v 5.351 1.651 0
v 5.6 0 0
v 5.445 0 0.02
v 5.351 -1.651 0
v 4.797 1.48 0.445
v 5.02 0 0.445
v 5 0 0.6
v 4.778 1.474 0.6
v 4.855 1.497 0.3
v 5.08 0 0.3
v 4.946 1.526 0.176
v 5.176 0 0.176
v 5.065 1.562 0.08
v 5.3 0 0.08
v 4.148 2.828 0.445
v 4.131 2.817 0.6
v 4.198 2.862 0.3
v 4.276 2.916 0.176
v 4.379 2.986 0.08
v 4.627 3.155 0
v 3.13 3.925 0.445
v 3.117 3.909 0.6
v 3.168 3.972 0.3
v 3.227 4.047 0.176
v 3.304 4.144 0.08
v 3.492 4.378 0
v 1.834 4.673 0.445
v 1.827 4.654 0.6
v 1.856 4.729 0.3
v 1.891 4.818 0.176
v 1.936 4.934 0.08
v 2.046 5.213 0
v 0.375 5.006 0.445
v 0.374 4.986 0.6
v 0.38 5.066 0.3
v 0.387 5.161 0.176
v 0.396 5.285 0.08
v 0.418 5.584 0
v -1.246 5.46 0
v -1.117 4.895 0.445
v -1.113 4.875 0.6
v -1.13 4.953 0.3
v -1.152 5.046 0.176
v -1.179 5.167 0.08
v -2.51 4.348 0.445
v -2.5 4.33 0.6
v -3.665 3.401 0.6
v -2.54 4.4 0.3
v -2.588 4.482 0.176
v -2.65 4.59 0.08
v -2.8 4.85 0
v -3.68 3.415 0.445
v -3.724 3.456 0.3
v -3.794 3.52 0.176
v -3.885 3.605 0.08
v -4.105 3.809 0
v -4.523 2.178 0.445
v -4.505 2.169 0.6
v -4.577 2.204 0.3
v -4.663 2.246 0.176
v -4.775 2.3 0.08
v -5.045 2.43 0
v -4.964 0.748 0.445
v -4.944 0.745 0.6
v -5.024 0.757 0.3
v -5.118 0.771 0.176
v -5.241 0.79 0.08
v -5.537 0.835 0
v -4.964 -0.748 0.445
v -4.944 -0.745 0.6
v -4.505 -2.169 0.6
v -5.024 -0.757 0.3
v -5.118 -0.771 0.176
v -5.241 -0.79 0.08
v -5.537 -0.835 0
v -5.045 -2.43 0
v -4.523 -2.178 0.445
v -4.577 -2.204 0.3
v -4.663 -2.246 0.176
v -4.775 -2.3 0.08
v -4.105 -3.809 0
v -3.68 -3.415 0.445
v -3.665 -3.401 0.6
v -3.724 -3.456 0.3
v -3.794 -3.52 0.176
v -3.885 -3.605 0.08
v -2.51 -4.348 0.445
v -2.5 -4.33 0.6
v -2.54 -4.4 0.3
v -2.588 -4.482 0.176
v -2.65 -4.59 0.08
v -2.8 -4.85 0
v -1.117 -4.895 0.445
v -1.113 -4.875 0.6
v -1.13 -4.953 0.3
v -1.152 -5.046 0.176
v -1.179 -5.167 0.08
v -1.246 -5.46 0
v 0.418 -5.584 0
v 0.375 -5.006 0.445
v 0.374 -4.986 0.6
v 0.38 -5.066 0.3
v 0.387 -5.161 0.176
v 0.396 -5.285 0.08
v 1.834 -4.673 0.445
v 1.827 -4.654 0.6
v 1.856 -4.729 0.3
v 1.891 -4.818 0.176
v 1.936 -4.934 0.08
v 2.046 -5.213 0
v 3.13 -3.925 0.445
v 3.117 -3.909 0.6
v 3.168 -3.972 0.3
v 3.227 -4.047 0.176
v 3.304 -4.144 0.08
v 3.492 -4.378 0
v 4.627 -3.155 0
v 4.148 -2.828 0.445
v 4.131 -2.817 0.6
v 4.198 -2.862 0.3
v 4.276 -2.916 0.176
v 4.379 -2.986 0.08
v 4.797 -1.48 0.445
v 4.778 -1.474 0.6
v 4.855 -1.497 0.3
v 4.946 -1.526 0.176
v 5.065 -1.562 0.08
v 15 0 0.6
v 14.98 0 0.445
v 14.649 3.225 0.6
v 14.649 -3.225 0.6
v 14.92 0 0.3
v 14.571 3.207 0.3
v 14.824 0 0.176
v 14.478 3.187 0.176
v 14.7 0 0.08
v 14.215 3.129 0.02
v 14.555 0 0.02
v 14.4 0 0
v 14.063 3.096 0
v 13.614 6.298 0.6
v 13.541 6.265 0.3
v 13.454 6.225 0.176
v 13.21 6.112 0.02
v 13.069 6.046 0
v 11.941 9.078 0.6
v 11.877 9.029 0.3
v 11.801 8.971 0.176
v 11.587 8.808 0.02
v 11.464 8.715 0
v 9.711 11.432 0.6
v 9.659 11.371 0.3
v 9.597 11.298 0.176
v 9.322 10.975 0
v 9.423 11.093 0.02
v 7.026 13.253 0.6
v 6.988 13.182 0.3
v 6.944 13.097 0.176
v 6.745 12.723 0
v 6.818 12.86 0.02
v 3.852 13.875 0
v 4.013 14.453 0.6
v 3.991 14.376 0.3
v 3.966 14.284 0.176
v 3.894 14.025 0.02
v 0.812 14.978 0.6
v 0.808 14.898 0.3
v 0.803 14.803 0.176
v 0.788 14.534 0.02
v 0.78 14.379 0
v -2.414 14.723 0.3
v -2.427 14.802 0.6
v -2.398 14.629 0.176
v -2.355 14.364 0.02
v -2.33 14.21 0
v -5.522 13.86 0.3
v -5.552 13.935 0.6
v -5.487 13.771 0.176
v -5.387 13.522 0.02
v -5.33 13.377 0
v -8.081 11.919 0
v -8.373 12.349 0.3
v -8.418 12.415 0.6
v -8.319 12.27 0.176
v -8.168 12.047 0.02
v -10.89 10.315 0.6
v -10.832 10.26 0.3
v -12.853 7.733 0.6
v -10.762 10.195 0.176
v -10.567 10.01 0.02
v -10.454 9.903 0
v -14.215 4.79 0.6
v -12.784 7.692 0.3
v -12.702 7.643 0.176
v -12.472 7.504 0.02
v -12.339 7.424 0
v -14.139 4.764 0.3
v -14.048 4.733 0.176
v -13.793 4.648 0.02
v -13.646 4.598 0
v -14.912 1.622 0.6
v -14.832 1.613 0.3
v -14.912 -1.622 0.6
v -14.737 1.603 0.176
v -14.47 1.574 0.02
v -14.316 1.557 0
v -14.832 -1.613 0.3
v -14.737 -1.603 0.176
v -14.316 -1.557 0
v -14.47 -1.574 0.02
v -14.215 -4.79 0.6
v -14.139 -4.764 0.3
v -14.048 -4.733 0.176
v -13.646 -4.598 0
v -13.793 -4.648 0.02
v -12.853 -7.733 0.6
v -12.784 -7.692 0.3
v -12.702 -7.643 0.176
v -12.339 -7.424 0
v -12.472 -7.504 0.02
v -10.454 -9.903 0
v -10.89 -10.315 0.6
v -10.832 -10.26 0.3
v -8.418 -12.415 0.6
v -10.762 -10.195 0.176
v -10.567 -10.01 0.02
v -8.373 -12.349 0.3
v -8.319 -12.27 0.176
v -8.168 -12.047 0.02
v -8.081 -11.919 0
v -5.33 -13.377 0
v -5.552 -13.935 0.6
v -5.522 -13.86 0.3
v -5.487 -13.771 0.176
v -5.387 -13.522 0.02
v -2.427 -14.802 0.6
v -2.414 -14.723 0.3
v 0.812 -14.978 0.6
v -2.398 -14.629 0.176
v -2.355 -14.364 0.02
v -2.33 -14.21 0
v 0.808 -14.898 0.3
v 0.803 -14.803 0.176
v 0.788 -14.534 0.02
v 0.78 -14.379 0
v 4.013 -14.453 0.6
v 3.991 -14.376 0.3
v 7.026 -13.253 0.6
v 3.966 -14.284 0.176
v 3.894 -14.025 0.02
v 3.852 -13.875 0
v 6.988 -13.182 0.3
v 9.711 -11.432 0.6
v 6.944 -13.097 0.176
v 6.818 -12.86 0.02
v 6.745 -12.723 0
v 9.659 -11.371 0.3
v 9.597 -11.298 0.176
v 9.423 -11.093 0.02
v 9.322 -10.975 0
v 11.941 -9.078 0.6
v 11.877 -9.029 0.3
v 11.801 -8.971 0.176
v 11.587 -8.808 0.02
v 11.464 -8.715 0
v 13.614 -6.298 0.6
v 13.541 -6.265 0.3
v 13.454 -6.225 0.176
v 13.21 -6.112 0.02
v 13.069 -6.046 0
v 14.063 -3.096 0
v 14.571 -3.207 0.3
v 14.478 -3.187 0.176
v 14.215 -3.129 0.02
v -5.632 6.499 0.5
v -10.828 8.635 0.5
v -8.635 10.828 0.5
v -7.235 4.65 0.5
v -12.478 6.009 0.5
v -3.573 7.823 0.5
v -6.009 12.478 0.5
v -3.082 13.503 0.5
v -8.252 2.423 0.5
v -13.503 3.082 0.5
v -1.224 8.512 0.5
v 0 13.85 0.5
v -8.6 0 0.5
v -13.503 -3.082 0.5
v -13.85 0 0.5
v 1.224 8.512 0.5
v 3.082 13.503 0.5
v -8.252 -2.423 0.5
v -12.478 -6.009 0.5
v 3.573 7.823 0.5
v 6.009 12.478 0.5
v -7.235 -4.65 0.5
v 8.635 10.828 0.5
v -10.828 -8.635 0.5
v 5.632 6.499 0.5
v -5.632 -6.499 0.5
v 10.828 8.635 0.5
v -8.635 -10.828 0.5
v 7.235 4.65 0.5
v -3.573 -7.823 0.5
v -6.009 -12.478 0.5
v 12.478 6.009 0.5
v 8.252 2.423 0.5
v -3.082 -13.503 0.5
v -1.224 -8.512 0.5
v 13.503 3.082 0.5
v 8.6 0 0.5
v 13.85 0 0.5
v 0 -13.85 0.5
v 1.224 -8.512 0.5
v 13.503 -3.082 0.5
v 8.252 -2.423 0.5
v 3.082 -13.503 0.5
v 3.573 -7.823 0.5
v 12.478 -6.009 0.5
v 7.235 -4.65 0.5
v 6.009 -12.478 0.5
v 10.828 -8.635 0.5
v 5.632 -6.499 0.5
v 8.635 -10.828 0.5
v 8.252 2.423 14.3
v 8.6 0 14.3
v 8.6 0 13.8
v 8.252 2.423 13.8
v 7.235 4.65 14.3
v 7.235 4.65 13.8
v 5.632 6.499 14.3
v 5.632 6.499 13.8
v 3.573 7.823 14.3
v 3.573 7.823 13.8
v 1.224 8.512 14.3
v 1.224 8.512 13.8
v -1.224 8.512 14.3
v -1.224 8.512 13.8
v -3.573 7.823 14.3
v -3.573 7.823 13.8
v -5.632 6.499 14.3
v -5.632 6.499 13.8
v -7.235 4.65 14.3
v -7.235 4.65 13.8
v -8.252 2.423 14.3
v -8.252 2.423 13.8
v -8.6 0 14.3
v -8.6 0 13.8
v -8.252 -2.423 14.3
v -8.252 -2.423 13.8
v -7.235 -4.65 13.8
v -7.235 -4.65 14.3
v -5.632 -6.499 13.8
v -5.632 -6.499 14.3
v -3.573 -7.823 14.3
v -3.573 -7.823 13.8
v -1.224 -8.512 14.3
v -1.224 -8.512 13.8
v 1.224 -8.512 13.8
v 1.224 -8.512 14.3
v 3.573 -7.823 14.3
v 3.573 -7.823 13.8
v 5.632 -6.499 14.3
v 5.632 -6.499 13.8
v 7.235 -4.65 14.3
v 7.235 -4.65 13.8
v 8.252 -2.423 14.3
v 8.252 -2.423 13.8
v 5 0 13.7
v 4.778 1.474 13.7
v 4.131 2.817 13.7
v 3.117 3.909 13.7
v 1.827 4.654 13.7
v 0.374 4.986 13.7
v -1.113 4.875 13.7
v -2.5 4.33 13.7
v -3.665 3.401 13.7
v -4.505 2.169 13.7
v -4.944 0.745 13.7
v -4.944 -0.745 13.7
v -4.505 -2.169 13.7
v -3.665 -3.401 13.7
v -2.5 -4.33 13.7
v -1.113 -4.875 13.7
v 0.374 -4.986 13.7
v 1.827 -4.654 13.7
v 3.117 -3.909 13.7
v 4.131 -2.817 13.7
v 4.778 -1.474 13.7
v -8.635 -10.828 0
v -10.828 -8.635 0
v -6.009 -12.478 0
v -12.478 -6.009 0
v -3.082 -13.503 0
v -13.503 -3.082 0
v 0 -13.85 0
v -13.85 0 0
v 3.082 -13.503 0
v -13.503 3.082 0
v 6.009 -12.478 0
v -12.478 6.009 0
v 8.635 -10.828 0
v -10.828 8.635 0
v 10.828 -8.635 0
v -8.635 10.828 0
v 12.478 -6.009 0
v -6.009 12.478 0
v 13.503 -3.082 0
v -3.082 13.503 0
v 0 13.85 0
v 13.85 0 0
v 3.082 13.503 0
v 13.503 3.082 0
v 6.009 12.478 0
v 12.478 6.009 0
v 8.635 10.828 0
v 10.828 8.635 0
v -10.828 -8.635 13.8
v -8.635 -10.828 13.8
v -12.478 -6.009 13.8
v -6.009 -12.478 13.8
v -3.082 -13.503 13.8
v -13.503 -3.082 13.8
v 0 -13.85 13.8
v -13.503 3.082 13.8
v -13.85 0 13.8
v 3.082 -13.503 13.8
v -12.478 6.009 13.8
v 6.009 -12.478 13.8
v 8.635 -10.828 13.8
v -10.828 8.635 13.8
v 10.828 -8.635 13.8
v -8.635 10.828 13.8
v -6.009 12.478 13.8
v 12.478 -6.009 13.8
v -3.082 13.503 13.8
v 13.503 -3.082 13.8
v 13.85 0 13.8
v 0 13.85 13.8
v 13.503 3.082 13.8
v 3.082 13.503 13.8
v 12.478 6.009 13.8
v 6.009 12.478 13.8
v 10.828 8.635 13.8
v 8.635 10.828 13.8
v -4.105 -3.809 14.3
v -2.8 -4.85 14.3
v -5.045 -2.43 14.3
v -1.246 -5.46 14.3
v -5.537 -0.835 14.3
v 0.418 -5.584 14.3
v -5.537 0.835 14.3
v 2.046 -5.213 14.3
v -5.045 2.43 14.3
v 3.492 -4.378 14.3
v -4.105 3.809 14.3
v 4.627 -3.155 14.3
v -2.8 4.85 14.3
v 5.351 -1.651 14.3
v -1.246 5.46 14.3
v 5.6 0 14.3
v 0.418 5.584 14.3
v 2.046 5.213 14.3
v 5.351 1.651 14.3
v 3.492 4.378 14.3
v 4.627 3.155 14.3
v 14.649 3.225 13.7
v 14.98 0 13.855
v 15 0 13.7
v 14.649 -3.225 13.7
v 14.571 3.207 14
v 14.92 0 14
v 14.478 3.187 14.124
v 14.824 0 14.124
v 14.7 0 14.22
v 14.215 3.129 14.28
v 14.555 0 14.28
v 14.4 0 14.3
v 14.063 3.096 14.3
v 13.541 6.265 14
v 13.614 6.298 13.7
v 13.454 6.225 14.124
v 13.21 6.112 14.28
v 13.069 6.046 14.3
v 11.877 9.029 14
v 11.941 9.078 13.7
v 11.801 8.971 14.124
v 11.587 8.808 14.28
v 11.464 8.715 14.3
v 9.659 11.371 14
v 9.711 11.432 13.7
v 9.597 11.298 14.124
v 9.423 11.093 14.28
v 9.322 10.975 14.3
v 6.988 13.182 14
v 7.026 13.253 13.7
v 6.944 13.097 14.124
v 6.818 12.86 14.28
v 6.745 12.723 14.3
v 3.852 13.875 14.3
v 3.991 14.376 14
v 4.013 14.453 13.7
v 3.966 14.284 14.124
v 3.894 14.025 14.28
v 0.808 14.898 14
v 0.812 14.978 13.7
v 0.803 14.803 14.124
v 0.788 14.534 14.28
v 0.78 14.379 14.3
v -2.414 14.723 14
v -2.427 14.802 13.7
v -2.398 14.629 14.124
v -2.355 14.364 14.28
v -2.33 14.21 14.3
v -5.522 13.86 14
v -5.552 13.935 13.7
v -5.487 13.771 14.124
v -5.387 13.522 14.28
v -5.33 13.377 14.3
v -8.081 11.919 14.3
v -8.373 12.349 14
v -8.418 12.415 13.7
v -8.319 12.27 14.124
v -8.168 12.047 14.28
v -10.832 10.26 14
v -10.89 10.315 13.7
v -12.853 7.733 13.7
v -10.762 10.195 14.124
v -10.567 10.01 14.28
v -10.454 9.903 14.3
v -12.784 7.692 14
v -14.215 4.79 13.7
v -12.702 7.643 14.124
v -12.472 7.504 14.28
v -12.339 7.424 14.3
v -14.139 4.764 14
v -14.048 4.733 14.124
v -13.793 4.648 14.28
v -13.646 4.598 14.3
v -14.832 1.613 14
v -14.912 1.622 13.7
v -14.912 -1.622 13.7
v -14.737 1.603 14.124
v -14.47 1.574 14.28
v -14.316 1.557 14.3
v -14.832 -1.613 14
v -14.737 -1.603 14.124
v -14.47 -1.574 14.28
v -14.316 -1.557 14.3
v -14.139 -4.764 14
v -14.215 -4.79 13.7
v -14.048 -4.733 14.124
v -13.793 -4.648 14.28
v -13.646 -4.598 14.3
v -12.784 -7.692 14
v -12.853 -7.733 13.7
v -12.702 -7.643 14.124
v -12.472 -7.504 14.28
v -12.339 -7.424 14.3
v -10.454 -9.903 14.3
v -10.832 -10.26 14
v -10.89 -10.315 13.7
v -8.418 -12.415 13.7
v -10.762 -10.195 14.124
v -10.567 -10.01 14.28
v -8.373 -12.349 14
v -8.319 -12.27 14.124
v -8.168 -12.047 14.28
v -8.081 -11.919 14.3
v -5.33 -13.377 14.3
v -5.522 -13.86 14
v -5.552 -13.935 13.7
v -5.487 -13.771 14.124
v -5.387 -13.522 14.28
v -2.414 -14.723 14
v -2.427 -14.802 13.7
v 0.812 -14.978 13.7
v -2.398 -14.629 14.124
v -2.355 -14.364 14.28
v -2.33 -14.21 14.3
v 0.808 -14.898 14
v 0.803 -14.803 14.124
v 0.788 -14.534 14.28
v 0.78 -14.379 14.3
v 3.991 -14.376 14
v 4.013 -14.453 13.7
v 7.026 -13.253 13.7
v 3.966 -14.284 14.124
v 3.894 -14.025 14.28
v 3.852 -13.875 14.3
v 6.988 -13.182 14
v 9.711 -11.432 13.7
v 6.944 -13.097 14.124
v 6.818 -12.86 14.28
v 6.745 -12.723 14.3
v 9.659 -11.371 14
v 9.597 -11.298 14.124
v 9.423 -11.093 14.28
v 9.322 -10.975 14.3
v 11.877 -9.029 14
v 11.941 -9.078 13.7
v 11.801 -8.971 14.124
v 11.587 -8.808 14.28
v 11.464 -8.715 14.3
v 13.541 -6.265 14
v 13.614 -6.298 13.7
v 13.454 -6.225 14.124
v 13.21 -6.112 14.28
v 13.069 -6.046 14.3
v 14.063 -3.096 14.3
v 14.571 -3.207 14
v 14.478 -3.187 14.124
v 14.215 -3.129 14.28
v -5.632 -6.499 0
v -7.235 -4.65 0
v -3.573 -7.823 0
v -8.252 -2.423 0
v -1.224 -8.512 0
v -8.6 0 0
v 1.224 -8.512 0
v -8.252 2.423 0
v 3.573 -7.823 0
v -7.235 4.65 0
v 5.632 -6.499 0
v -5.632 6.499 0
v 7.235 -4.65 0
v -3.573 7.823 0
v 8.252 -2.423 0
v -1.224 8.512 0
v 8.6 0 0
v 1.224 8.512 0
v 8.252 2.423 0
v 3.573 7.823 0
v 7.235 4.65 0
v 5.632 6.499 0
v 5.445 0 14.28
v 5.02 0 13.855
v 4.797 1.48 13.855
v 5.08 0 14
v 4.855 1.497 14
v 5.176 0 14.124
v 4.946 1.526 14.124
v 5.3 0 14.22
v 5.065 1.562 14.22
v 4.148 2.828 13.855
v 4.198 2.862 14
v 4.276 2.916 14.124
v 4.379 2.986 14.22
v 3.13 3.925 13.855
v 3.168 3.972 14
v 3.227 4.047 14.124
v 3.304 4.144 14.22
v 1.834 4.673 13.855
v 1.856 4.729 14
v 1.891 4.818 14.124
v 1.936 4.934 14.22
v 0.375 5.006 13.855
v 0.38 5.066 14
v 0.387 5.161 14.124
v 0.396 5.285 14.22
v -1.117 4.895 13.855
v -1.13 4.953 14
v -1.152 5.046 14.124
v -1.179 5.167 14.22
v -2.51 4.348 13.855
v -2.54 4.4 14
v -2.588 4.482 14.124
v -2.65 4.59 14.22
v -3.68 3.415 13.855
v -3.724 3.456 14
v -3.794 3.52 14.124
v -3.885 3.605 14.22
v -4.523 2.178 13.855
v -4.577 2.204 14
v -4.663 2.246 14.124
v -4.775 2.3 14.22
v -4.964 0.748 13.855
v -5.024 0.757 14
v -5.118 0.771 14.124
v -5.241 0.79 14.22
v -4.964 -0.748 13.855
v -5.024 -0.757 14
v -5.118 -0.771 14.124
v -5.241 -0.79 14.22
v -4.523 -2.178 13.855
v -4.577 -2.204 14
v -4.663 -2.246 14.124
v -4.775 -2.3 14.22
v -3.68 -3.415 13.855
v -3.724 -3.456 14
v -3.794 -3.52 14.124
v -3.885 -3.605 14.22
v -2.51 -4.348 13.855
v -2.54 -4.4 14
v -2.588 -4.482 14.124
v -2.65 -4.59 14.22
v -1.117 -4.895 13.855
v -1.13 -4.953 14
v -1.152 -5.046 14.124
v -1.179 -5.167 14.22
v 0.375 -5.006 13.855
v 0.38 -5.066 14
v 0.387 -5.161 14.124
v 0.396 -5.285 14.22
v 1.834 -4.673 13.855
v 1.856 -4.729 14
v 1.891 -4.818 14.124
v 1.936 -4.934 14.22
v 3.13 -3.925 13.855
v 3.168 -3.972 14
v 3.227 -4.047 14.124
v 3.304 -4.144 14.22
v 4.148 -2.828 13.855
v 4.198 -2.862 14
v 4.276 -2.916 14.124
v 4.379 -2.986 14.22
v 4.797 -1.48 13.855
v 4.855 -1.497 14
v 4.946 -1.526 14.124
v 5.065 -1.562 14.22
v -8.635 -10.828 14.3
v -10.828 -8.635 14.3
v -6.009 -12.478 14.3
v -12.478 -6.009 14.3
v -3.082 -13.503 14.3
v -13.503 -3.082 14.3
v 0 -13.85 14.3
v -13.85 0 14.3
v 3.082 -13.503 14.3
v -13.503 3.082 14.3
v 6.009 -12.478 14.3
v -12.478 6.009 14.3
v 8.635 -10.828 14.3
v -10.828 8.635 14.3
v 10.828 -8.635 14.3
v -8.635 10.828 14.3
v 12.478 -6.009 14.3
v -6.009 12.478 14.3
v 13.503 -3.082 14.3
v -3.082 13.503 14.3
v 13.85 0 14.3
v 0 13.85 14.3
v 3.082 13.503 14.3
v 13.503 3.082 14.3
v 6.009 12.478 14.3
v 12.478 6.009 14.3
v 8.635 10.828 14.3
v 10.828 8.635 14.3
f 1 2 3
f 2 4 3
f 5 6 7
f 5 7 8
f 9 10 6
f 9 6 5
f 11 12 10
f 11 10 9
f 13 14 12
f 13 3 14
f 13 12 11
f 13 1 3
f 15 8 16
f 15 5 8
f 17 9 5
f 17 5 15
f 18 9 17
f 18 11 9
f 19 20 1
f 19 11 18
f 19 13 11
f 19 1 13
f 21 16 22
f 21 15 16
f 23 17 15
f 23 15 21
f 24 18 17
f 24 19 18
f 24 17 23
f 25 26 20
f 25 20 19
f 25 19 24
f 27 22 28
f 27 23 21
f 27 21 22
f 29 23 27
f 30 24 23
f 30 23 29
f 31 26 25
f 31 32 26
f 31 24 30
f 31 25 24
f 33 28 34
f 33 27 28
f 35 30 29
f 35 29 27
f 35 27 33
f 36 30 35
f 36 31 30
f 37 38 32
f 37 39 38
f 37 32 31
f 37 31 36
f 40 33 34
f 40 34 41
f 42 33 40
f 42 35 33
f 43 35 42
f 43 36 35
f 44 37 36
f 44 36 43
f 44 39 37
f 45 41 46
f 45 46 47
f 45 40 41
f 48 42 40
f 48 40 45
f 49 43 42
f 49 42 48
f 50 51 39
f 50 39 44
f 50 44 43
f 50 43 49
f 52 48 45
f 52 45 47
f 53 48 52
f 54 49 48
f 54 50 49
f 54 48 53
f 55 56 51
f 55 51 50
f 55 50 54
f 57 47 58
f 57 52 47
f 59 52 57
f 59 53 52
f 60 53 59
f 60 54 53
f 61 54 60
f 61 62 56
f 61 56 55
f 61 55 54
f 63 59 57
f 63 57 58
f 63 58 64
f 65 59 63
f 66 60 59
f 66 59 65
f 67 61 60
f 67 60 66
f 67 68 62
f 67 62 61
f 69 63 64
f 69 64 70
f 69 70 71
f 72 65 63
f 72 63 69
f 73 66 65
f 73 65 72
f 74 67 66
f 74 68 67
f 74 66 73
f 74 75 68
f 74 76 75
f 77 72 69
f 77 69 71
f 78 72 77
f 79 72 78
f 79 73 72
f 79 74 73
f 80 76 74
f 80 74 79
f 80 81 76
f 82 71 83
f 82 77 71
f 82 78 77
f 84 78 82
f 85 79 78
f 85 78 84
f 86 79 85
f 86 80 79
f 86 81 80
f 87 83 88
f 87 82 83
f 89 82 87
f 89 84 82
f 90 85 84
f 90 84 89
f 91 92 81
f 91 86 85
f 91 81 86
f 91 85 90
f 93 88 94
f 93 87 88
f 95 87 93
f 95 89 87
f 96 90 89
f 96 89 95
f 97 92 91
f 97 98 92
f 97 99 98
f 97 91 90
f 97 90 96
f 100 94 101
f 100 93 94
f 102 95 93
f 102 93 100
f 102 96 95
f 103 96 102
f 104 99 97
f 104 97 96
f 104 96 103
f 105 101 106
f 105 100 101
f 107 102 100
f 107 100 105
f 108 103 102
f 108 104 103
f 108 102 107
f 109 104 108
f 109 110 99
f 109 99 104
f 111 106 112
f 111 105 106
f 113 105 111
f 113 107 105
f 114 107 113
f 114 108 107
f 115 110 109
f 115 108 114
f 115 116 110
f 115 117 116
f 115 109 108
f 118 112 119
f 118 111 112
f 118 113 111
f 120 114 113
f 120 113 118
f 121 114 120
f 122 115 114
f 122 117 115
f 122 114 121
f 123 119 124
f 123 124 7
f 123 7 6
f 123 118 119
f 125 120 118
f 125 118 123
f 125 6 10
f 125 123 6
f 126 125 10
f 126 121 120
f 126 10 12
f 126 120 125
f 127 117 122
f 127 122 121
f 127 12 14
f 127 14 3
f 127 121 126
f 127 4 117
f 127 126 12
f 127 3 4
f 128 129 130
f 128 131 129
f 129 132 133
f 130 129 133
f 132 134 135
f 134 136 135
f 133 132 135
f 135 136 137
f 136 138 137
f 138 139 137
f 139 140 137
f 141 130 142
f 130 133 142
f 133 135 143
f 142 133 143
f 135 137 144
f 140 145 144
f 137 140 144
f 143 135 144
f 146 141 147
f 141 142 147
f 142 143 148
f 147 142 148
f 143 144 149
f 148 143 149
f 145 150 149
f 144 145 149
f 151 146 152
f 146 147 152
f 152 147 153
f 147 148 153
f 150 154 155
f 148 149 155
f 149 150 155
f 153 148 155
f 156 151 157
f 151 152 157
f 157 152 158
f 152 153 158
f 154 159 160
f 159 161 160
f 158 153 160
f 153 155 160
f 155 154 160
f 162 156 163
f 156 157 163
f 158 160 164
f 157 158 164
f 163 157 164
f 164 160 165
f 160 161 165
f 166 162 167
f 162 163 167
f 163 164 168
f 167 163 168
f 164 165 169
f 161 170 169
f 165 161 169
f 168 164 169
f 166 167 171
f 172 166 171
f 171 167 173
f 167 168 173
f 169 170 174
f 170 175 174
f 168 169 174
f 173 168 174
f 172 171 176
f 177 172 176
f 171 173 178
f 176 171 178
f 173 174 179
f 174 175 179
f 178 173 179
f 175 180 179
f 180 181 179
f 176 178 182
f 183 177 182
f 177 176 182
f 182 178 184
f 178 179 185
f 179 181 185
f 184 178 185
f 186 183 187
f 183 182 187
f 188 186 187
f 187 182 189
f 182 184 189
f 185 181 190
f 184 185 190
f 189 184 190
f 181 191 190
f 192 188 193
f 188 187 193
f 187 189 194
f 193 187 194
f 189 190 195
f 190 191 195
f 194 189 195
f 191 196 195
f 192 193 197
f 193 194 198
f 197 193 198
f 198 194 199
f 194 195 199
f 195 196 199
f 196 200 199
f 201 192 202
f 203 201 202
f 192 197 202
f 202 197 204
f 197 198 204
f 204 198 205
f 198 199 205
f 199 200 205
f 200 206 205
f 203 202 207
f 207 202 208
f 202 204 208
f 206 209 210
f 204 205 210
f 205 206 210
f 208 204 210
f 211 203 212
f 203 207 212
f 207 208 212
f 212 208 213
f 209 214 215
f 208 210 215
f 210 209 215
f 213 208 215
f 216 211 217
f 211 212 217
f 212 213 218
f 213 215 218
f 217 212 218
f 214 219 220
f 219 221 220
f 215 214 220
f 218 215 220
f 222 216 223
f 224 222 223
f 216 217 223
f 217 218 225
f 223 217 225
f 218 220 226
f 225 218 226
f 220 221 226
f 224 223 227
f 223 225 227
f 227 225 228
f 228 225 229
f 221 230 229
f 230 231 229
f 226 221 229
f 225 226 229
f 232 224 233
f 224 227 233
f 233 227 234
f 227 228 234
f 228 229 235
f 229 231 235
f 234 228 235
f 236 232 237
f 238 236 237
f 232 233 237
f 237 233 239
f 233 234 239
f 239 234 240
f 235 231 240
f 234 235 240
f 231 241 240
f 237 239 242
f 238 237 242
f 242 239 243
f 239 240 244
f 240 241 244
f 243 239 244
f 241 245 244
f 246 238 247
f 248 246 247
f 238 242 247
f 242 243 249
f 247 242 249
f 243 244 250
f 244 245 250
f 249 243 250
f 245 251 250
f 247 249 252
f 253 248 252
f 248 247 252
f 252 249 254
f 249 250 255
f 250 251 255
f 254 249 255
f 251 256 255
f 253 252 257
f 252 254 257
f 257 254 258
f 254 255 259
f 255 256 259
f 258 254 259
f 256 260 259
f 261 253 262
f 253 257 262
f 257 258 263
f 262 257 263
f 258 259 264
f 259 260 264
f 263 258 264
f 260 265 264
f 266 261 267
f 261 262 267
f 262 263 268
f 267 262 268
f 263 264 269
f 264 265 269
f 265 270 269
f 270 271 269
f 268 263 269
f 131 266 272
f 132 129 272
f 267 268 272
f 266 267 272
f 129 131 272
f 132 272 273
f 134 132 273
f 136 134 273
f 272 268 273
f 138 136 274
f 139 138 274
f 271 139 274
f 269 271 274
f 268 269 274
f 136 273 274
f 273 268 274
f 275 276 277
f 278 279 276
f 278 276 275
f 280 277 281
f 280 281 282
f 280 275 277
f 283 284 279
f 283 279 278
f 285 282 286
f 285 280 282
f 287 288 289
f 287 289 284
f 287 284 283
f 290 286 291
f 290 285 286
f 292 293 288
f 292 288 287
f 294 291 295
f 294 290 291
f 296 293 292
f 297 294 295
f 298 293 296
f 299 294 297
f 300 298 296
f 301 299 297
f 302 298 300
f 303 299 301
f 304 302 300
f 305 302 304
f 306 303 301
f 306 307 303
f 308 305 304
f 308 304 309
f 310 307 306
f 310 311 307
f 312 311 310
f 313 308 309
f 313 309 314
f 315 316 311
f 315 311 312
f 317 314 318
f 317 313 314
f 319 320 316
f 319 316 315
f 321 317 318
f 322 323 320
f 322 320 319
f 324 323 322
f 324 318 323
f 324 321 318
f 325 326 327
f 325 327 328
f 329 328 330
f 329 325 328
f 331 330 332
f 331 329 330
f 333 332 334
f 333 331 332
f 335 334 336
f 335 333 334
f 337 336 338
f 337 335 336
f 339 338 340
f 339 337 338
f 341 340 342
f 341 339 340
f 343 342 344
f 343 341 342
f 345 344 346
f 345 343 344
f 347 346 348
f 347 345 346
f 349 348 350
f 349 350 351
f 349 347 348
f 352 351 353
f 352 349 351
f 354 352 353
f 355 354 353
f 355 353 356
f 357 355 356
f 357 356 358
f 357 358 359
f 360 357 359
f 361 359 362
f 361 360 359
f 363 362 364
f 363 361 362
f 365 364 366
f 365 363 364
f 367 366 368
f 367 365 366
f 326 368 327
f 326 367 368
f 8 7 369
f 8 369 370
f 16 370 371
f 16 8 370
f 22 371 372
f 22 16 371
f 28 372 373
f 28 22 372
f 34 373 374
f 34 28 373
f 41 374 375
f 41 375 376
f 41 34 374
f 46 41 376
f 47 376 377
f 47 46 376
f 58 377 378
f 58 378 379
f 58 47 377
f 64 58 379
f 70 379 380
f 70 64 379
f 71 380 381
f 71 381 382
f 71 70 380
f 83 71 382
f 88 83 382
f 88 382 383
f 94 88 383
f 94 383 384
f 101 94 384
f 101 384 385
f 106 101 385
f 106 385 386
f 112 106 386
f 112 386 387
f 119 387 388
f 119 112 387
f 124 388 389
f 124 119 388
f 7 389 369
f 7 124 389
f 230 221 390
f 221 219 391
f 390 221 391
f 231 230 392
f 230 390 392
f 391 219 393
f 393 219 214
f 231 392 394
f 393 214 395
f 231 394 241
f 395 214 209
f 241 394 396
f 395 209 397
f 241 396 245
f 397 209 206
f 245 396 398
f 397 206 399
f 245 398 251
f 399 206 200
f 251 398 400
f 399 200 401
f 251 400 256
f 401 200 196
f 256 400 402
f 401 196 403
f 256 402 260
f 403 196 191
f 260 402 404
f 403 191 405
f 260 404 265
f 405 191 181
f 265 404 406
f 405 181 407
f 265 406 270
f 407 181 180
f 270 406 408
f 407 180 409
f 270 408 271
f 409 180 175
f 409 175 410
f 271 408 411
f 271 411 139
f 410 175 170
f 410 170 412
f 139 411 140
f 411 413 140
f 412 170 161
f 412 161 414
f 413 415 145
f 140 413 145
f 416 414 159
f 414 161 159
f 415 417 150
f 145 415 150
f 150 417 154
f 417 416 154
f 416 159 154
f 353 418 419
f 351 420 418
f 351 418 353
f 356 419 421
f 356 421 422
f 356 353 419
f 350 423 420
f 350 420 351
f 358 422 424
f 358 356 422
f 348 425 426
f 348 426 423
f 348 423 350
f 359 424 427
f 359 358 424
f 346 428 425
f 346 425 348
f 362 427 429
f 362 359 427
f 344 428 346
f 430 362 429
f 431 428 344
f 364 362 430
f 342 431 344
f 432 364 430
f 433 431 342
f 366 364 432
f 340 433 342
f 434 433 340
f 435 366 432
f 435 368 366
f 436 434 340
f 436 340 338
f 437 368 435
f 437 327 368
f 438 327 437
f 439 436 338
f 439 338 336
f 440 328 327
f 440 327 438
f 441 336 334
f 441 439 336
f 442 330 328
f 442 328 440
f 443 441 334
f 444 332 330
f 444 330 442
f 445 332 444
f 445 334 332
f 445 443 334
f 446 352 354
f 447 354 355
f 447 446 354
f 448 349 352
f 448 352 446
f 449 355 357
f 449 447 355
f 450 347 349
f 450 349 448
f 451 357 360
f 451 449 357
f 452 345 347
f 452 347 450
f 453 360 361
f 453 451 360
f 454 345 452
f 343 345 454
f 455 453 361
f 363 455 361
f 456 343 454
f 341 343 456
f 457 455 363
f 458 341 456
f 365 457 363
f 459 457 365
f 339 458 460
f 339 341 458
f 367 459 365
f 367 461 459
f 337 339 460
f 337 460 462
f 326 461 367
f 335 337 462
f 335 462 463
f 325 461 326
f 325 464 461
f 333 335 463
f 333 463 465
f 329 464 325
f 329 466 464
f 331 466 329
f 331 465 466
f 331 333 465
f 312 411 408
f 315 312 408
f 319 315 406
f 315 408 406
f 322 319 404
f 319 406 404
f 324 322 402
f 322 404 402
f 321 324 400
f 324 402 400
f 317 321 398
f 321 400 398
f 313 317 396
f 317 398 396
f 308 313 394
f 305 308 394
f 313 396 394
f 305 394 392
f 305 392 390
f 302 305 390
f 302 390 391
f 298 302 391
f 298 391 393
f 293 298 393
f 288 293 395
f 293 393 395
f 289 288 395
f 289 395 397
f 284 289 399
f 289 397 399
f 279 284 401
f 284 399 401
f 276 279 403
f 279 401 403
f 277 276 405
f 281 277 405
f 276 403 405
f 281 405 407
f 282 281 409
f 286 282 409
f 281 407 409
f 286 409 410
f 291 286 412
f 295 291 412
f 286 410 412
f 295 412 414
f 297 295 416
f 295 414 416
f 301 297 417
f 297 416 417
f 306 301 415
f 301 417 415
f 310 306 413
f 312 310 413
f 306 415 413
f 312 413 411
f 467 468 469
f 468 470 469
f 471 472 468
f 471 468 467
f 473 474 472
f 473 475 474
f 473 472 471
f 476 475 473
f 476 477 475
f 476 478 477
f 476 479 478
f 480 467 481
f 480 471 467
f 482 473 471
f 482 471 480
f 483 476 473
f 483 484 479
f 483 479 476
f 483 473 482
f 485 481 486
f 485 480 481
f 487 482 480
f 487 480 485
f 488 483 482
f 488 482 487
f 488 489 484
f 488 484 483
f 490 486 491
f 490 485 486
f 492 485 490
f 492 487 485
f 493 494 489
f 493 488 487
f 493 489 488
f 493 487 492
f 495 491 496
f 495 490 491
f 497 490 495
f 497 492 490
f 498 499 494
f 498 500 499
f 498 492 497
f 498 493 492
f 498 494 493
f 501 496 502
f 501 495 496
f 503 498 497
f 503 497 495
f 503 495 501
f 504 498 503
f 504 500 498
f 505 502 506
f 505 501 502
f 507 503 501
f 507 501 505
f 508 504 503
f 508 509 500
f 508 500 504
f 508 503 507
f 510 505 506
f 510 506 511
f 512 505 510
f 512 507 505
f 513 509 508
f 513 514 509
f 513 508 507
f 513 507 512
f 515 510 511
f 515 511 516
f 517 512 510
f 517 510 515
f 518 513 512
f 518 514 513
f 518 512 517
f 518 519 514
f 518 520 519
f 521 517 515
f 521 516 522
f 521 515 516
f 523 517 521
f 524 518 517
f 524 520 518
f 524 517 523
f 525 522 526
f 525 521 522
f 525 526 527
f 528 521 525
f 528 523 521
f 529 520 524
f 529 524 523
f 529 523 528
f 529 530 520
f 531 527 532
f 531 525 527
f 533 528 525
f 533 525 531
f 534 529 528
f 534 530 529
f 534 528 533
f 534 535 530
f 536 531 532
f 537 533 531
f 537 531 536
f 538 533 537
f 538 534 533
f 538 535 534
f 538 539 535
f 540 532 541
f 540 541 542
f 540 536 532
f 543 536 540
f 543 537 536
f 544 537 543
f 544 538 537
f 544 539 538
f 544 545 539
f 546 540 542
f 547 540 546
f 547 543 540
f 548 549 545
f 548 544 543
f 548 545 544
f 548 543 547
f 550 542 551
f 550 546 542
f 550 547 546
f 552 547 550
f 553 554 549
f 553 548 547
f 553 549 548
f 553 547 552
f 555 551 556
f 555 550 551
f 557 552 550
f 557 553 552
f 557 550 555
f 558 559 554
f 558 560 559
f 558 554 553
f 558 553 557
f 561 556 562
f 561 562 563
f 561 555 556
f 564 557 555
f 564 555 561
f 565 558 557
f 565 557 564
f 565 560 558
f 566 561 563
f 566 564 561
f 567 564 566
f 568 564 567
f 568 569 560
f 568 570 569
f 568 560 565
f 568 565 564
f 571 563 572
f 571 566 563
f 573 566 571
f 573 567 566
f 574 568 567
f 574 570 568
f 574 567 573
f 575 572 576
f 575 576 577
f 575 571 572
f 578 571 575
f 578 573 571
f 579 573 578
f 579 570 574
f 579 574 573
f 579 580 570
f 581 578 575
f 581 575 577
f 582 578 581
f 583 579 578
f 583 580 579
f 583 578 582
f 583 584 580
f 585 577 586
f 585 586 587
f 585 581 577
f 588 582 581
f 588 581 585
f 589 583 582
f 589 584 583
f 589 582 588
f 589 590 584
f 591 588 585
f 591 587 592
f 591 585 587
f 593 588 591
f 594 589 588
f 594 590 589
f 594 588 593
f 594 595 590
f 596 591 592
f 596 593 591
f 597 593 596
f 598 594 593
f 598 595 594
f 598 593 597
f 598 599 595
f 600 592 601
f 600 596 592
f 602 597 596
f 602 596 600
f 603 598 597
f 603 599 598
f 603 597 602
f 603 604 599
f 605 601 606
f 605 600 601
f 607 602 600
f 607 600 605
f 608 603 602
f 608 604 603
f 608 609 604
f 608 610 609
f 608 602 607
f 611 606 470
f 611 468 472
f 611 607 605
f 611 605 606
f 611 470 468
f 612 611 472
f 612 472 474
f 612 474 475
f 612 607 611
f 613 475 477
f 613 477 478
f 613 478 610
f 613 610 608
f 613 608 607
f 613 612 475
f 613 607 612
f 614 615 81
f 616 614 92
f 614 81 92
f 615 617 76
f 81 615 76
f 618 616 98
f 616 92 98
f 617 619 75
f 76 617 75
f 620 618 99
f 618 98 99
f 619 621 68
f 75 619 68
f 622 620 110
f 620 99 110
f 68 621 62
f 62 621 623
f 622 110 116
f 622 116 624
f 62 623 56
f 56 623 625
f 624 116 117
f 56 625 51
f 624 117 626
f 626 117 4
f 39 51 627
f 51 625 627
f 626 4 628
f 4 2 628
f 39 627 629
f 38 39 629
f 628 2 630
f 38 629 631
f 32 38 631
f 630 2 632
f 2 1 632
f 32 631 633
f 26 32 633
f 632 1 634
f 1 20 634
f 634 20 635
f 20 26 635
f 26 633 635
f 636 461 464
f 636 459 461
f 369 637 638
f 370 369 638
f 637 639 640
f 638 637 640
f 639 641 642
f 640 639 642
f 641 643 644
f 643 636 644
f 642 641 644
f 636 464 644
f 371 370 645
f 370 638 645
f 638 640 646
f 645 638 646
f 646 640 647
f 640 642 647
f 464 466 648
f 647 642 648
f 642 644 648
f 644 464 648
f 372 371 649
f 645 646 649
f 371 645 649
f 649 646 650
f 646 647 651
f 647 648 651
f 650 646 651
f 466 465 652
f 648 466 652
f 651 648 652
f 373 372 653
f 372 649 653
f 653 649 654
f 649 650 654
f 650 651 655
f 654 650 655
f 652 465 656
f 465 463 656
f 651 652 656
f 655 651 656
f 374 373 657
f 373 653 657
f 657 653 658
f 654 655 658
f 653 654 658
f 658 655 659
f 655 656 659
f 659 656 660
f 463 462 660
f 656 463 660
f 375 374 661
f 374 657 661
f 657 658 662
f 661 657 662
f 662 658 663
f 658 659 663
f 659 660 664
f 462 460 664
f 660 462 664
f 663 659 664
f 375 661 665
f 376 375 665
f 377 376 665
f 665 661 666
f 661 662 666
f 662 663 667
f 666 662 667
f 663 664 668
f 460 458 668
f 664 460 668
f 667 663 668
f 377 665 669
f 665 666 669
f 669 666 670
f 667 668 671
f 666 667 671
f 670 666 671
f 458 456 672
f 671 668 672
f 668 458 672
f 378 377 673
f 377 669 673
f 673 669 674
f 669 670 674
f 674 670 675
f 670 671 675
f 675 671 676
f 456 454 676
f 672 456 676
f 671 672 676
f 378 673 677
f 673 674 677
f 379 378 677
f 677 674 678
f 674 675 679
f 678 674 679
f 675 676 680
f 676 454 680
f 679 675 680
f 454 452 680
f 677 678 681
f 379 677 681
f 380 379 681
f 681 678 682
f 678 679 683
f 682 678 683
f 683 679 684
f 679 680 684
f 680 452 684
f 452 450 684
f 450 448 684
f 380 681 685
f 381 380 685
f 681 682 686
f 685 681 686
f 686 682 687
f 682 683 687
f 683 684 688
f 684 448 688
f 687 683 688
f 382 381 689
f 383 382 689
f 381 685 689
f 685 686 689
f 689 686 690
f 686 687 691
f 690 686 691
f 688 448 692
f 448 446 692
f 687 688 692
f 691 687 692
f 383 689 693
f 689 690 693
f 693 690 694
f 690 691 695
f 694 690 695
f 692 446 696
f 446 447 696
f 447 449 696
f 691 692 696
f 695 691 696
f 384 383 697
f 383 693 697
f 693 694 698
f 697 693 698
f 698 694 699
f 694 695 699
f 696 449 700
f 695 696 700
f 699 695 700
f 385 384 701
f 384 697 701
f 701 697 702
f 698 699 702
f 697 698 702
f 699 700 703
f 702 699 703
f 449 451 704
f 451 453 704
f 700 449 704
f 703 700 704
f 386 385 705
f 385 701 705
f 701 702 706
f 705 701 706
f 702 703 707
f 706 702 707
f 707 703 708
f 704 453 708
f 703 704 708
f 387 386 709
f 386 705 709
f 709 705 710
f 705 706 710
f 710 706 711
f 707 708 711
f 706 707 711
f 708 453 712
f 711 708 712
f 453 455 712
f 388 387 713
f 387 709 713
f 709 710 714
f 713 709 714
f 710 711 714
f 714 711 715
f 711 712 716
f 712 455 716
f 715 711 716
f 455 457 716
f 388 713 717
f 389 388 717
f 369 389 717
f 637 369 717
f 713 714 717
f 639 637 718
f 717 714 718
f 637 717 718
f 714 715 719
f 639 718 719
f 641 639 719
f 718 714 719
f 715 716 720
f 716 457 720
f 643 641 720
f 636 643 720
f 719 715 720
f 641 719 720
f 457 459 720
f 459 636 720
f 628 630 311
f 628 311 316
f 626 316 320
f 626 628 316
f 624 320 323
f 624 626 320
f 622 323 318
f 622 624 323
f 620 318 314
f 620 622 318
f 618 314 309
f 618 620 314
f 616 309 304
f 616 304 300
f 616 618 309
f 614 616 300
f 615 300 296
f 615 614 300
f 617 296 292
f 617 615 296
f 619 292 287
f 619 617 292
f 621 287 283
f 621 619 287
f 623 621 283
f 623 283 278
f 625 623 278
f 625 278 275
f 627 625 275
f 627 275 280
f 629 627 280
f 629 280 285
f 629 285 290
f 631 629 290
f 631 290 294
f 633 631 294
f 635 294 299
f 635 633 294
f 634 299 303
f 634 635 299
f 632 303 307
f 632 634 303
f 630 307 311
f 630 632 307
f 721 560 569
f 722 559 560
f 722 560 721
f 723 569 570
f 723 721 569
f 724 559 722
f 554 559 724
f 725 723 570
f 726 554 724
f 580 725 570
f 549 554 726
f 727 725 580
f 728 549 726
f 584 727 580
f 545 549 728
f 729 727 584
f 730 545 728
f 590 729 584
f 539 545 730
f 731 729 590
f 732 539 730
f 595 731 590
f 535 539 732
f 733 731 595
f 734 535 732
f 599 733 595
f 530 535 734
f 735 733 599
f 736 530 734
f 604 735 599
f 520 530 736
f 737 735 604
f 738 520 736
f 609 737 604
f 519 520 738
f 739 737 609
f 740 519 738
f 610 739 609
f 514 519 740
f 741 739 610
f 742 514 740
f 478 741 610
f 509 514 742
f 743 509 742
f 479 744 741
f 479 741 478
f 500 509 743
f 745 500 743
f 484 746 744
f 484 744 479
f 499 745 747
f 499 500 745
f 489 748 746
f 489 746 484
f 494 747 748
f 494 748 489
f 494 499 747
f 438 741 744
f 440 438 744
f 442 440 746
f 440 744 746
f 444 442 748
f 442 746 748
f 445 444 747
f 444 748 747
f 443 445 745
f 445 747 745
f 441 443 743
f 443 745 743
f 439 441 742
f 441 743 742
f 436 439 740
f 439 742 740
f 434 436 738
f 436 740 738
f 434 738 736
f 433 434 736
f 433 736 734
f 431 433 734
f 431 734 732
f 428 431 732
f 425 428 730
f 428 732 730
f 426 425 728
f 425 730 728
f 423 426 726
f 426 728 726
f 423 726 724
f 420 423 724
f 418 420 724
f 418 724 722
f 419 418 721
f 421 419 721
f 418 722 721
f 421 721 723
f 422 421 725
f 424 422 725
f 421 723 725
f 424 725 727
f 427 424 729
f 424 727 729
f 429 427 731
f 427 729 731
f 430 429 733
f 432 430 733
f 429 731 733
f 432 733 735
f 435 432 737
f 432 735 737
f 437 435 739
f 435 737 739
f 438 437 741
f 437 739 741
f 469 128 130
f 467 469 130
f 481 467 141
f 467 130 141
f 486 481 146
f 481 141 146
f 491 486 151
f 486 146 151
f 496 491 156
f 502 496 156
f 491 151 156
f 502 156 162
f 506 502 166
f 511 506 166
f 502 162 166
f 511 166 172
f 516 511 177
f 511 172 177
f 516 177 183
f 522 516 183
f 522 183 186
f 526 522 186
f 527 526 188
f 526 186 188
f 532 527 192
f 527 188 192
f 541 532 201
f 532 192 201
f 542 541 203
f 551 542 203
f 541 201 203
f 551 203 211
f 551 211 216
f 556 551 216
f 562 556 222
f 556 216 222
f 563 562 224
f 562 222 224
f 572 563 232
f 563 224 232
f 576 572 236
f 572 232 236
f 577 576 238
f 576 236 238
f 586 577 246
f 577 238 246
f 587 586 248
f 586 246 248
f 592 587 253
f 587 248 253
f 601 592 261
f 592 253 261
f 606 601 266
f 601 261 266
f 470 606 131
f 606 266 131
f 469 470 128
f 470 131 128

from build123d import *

# Parameters (mm, degrees)
F0_R     = 15
F0_R_2   = 5
F1_DEPTH = 14.3
F2_R     = 0.6
F3_R     = 13.85
F3_R_2   = 8.6
F4_DEPTH = 0.5
F5_R     = 13.85
F5_R_2   = 8.6
F6_DEPTH = 0.5


with BuildPart() as f1:
    # F0 (on Top) → F1 (new body)
    with BuildSketch(Plane.XY):
        Circle(F0_R)
        Circle(F0_R_2, mode=Mode.SUBTRACT)
    extrude(amount=F1_DEPTH)

    # F2
    f2_edges = [f1.edges().sort_by_distance(p)[0] for p in [
        (5, 0, 7.15),
        (-5, 0, 0),
        (-5, 0, 14.3),
        (15, 0, 7.15),
        (-15, 0, 0),
        (-15, 0, 14.3),
    ]]
    fillet(f2_edges, radius=F2_R)

    # F3 (on face) → F4 (cut)
    with BuildSketch(Plane.XY.offset(14.3)):
        Circle(F3_R)
        Circle(F3_R_2, mode=Mode.SUBTRACT)
    extrude(amount=-F4_DEPTH, mode=Mode.SUBTRACT)

    # F5 (on face) → F6 (cut)
    with BuildSketch(Plane(origin=(0, 0, 0), x_dir=(1, 0, 0), z_dir=(0, 0, -1))):
        Circle(F5_R)
        Circle(F5_R_2, mode=Mode.SUBTRACT)
    extrude(amount=-F6_DEPTH, mode=Mode.SUBTRACT)


solid = f1.part
